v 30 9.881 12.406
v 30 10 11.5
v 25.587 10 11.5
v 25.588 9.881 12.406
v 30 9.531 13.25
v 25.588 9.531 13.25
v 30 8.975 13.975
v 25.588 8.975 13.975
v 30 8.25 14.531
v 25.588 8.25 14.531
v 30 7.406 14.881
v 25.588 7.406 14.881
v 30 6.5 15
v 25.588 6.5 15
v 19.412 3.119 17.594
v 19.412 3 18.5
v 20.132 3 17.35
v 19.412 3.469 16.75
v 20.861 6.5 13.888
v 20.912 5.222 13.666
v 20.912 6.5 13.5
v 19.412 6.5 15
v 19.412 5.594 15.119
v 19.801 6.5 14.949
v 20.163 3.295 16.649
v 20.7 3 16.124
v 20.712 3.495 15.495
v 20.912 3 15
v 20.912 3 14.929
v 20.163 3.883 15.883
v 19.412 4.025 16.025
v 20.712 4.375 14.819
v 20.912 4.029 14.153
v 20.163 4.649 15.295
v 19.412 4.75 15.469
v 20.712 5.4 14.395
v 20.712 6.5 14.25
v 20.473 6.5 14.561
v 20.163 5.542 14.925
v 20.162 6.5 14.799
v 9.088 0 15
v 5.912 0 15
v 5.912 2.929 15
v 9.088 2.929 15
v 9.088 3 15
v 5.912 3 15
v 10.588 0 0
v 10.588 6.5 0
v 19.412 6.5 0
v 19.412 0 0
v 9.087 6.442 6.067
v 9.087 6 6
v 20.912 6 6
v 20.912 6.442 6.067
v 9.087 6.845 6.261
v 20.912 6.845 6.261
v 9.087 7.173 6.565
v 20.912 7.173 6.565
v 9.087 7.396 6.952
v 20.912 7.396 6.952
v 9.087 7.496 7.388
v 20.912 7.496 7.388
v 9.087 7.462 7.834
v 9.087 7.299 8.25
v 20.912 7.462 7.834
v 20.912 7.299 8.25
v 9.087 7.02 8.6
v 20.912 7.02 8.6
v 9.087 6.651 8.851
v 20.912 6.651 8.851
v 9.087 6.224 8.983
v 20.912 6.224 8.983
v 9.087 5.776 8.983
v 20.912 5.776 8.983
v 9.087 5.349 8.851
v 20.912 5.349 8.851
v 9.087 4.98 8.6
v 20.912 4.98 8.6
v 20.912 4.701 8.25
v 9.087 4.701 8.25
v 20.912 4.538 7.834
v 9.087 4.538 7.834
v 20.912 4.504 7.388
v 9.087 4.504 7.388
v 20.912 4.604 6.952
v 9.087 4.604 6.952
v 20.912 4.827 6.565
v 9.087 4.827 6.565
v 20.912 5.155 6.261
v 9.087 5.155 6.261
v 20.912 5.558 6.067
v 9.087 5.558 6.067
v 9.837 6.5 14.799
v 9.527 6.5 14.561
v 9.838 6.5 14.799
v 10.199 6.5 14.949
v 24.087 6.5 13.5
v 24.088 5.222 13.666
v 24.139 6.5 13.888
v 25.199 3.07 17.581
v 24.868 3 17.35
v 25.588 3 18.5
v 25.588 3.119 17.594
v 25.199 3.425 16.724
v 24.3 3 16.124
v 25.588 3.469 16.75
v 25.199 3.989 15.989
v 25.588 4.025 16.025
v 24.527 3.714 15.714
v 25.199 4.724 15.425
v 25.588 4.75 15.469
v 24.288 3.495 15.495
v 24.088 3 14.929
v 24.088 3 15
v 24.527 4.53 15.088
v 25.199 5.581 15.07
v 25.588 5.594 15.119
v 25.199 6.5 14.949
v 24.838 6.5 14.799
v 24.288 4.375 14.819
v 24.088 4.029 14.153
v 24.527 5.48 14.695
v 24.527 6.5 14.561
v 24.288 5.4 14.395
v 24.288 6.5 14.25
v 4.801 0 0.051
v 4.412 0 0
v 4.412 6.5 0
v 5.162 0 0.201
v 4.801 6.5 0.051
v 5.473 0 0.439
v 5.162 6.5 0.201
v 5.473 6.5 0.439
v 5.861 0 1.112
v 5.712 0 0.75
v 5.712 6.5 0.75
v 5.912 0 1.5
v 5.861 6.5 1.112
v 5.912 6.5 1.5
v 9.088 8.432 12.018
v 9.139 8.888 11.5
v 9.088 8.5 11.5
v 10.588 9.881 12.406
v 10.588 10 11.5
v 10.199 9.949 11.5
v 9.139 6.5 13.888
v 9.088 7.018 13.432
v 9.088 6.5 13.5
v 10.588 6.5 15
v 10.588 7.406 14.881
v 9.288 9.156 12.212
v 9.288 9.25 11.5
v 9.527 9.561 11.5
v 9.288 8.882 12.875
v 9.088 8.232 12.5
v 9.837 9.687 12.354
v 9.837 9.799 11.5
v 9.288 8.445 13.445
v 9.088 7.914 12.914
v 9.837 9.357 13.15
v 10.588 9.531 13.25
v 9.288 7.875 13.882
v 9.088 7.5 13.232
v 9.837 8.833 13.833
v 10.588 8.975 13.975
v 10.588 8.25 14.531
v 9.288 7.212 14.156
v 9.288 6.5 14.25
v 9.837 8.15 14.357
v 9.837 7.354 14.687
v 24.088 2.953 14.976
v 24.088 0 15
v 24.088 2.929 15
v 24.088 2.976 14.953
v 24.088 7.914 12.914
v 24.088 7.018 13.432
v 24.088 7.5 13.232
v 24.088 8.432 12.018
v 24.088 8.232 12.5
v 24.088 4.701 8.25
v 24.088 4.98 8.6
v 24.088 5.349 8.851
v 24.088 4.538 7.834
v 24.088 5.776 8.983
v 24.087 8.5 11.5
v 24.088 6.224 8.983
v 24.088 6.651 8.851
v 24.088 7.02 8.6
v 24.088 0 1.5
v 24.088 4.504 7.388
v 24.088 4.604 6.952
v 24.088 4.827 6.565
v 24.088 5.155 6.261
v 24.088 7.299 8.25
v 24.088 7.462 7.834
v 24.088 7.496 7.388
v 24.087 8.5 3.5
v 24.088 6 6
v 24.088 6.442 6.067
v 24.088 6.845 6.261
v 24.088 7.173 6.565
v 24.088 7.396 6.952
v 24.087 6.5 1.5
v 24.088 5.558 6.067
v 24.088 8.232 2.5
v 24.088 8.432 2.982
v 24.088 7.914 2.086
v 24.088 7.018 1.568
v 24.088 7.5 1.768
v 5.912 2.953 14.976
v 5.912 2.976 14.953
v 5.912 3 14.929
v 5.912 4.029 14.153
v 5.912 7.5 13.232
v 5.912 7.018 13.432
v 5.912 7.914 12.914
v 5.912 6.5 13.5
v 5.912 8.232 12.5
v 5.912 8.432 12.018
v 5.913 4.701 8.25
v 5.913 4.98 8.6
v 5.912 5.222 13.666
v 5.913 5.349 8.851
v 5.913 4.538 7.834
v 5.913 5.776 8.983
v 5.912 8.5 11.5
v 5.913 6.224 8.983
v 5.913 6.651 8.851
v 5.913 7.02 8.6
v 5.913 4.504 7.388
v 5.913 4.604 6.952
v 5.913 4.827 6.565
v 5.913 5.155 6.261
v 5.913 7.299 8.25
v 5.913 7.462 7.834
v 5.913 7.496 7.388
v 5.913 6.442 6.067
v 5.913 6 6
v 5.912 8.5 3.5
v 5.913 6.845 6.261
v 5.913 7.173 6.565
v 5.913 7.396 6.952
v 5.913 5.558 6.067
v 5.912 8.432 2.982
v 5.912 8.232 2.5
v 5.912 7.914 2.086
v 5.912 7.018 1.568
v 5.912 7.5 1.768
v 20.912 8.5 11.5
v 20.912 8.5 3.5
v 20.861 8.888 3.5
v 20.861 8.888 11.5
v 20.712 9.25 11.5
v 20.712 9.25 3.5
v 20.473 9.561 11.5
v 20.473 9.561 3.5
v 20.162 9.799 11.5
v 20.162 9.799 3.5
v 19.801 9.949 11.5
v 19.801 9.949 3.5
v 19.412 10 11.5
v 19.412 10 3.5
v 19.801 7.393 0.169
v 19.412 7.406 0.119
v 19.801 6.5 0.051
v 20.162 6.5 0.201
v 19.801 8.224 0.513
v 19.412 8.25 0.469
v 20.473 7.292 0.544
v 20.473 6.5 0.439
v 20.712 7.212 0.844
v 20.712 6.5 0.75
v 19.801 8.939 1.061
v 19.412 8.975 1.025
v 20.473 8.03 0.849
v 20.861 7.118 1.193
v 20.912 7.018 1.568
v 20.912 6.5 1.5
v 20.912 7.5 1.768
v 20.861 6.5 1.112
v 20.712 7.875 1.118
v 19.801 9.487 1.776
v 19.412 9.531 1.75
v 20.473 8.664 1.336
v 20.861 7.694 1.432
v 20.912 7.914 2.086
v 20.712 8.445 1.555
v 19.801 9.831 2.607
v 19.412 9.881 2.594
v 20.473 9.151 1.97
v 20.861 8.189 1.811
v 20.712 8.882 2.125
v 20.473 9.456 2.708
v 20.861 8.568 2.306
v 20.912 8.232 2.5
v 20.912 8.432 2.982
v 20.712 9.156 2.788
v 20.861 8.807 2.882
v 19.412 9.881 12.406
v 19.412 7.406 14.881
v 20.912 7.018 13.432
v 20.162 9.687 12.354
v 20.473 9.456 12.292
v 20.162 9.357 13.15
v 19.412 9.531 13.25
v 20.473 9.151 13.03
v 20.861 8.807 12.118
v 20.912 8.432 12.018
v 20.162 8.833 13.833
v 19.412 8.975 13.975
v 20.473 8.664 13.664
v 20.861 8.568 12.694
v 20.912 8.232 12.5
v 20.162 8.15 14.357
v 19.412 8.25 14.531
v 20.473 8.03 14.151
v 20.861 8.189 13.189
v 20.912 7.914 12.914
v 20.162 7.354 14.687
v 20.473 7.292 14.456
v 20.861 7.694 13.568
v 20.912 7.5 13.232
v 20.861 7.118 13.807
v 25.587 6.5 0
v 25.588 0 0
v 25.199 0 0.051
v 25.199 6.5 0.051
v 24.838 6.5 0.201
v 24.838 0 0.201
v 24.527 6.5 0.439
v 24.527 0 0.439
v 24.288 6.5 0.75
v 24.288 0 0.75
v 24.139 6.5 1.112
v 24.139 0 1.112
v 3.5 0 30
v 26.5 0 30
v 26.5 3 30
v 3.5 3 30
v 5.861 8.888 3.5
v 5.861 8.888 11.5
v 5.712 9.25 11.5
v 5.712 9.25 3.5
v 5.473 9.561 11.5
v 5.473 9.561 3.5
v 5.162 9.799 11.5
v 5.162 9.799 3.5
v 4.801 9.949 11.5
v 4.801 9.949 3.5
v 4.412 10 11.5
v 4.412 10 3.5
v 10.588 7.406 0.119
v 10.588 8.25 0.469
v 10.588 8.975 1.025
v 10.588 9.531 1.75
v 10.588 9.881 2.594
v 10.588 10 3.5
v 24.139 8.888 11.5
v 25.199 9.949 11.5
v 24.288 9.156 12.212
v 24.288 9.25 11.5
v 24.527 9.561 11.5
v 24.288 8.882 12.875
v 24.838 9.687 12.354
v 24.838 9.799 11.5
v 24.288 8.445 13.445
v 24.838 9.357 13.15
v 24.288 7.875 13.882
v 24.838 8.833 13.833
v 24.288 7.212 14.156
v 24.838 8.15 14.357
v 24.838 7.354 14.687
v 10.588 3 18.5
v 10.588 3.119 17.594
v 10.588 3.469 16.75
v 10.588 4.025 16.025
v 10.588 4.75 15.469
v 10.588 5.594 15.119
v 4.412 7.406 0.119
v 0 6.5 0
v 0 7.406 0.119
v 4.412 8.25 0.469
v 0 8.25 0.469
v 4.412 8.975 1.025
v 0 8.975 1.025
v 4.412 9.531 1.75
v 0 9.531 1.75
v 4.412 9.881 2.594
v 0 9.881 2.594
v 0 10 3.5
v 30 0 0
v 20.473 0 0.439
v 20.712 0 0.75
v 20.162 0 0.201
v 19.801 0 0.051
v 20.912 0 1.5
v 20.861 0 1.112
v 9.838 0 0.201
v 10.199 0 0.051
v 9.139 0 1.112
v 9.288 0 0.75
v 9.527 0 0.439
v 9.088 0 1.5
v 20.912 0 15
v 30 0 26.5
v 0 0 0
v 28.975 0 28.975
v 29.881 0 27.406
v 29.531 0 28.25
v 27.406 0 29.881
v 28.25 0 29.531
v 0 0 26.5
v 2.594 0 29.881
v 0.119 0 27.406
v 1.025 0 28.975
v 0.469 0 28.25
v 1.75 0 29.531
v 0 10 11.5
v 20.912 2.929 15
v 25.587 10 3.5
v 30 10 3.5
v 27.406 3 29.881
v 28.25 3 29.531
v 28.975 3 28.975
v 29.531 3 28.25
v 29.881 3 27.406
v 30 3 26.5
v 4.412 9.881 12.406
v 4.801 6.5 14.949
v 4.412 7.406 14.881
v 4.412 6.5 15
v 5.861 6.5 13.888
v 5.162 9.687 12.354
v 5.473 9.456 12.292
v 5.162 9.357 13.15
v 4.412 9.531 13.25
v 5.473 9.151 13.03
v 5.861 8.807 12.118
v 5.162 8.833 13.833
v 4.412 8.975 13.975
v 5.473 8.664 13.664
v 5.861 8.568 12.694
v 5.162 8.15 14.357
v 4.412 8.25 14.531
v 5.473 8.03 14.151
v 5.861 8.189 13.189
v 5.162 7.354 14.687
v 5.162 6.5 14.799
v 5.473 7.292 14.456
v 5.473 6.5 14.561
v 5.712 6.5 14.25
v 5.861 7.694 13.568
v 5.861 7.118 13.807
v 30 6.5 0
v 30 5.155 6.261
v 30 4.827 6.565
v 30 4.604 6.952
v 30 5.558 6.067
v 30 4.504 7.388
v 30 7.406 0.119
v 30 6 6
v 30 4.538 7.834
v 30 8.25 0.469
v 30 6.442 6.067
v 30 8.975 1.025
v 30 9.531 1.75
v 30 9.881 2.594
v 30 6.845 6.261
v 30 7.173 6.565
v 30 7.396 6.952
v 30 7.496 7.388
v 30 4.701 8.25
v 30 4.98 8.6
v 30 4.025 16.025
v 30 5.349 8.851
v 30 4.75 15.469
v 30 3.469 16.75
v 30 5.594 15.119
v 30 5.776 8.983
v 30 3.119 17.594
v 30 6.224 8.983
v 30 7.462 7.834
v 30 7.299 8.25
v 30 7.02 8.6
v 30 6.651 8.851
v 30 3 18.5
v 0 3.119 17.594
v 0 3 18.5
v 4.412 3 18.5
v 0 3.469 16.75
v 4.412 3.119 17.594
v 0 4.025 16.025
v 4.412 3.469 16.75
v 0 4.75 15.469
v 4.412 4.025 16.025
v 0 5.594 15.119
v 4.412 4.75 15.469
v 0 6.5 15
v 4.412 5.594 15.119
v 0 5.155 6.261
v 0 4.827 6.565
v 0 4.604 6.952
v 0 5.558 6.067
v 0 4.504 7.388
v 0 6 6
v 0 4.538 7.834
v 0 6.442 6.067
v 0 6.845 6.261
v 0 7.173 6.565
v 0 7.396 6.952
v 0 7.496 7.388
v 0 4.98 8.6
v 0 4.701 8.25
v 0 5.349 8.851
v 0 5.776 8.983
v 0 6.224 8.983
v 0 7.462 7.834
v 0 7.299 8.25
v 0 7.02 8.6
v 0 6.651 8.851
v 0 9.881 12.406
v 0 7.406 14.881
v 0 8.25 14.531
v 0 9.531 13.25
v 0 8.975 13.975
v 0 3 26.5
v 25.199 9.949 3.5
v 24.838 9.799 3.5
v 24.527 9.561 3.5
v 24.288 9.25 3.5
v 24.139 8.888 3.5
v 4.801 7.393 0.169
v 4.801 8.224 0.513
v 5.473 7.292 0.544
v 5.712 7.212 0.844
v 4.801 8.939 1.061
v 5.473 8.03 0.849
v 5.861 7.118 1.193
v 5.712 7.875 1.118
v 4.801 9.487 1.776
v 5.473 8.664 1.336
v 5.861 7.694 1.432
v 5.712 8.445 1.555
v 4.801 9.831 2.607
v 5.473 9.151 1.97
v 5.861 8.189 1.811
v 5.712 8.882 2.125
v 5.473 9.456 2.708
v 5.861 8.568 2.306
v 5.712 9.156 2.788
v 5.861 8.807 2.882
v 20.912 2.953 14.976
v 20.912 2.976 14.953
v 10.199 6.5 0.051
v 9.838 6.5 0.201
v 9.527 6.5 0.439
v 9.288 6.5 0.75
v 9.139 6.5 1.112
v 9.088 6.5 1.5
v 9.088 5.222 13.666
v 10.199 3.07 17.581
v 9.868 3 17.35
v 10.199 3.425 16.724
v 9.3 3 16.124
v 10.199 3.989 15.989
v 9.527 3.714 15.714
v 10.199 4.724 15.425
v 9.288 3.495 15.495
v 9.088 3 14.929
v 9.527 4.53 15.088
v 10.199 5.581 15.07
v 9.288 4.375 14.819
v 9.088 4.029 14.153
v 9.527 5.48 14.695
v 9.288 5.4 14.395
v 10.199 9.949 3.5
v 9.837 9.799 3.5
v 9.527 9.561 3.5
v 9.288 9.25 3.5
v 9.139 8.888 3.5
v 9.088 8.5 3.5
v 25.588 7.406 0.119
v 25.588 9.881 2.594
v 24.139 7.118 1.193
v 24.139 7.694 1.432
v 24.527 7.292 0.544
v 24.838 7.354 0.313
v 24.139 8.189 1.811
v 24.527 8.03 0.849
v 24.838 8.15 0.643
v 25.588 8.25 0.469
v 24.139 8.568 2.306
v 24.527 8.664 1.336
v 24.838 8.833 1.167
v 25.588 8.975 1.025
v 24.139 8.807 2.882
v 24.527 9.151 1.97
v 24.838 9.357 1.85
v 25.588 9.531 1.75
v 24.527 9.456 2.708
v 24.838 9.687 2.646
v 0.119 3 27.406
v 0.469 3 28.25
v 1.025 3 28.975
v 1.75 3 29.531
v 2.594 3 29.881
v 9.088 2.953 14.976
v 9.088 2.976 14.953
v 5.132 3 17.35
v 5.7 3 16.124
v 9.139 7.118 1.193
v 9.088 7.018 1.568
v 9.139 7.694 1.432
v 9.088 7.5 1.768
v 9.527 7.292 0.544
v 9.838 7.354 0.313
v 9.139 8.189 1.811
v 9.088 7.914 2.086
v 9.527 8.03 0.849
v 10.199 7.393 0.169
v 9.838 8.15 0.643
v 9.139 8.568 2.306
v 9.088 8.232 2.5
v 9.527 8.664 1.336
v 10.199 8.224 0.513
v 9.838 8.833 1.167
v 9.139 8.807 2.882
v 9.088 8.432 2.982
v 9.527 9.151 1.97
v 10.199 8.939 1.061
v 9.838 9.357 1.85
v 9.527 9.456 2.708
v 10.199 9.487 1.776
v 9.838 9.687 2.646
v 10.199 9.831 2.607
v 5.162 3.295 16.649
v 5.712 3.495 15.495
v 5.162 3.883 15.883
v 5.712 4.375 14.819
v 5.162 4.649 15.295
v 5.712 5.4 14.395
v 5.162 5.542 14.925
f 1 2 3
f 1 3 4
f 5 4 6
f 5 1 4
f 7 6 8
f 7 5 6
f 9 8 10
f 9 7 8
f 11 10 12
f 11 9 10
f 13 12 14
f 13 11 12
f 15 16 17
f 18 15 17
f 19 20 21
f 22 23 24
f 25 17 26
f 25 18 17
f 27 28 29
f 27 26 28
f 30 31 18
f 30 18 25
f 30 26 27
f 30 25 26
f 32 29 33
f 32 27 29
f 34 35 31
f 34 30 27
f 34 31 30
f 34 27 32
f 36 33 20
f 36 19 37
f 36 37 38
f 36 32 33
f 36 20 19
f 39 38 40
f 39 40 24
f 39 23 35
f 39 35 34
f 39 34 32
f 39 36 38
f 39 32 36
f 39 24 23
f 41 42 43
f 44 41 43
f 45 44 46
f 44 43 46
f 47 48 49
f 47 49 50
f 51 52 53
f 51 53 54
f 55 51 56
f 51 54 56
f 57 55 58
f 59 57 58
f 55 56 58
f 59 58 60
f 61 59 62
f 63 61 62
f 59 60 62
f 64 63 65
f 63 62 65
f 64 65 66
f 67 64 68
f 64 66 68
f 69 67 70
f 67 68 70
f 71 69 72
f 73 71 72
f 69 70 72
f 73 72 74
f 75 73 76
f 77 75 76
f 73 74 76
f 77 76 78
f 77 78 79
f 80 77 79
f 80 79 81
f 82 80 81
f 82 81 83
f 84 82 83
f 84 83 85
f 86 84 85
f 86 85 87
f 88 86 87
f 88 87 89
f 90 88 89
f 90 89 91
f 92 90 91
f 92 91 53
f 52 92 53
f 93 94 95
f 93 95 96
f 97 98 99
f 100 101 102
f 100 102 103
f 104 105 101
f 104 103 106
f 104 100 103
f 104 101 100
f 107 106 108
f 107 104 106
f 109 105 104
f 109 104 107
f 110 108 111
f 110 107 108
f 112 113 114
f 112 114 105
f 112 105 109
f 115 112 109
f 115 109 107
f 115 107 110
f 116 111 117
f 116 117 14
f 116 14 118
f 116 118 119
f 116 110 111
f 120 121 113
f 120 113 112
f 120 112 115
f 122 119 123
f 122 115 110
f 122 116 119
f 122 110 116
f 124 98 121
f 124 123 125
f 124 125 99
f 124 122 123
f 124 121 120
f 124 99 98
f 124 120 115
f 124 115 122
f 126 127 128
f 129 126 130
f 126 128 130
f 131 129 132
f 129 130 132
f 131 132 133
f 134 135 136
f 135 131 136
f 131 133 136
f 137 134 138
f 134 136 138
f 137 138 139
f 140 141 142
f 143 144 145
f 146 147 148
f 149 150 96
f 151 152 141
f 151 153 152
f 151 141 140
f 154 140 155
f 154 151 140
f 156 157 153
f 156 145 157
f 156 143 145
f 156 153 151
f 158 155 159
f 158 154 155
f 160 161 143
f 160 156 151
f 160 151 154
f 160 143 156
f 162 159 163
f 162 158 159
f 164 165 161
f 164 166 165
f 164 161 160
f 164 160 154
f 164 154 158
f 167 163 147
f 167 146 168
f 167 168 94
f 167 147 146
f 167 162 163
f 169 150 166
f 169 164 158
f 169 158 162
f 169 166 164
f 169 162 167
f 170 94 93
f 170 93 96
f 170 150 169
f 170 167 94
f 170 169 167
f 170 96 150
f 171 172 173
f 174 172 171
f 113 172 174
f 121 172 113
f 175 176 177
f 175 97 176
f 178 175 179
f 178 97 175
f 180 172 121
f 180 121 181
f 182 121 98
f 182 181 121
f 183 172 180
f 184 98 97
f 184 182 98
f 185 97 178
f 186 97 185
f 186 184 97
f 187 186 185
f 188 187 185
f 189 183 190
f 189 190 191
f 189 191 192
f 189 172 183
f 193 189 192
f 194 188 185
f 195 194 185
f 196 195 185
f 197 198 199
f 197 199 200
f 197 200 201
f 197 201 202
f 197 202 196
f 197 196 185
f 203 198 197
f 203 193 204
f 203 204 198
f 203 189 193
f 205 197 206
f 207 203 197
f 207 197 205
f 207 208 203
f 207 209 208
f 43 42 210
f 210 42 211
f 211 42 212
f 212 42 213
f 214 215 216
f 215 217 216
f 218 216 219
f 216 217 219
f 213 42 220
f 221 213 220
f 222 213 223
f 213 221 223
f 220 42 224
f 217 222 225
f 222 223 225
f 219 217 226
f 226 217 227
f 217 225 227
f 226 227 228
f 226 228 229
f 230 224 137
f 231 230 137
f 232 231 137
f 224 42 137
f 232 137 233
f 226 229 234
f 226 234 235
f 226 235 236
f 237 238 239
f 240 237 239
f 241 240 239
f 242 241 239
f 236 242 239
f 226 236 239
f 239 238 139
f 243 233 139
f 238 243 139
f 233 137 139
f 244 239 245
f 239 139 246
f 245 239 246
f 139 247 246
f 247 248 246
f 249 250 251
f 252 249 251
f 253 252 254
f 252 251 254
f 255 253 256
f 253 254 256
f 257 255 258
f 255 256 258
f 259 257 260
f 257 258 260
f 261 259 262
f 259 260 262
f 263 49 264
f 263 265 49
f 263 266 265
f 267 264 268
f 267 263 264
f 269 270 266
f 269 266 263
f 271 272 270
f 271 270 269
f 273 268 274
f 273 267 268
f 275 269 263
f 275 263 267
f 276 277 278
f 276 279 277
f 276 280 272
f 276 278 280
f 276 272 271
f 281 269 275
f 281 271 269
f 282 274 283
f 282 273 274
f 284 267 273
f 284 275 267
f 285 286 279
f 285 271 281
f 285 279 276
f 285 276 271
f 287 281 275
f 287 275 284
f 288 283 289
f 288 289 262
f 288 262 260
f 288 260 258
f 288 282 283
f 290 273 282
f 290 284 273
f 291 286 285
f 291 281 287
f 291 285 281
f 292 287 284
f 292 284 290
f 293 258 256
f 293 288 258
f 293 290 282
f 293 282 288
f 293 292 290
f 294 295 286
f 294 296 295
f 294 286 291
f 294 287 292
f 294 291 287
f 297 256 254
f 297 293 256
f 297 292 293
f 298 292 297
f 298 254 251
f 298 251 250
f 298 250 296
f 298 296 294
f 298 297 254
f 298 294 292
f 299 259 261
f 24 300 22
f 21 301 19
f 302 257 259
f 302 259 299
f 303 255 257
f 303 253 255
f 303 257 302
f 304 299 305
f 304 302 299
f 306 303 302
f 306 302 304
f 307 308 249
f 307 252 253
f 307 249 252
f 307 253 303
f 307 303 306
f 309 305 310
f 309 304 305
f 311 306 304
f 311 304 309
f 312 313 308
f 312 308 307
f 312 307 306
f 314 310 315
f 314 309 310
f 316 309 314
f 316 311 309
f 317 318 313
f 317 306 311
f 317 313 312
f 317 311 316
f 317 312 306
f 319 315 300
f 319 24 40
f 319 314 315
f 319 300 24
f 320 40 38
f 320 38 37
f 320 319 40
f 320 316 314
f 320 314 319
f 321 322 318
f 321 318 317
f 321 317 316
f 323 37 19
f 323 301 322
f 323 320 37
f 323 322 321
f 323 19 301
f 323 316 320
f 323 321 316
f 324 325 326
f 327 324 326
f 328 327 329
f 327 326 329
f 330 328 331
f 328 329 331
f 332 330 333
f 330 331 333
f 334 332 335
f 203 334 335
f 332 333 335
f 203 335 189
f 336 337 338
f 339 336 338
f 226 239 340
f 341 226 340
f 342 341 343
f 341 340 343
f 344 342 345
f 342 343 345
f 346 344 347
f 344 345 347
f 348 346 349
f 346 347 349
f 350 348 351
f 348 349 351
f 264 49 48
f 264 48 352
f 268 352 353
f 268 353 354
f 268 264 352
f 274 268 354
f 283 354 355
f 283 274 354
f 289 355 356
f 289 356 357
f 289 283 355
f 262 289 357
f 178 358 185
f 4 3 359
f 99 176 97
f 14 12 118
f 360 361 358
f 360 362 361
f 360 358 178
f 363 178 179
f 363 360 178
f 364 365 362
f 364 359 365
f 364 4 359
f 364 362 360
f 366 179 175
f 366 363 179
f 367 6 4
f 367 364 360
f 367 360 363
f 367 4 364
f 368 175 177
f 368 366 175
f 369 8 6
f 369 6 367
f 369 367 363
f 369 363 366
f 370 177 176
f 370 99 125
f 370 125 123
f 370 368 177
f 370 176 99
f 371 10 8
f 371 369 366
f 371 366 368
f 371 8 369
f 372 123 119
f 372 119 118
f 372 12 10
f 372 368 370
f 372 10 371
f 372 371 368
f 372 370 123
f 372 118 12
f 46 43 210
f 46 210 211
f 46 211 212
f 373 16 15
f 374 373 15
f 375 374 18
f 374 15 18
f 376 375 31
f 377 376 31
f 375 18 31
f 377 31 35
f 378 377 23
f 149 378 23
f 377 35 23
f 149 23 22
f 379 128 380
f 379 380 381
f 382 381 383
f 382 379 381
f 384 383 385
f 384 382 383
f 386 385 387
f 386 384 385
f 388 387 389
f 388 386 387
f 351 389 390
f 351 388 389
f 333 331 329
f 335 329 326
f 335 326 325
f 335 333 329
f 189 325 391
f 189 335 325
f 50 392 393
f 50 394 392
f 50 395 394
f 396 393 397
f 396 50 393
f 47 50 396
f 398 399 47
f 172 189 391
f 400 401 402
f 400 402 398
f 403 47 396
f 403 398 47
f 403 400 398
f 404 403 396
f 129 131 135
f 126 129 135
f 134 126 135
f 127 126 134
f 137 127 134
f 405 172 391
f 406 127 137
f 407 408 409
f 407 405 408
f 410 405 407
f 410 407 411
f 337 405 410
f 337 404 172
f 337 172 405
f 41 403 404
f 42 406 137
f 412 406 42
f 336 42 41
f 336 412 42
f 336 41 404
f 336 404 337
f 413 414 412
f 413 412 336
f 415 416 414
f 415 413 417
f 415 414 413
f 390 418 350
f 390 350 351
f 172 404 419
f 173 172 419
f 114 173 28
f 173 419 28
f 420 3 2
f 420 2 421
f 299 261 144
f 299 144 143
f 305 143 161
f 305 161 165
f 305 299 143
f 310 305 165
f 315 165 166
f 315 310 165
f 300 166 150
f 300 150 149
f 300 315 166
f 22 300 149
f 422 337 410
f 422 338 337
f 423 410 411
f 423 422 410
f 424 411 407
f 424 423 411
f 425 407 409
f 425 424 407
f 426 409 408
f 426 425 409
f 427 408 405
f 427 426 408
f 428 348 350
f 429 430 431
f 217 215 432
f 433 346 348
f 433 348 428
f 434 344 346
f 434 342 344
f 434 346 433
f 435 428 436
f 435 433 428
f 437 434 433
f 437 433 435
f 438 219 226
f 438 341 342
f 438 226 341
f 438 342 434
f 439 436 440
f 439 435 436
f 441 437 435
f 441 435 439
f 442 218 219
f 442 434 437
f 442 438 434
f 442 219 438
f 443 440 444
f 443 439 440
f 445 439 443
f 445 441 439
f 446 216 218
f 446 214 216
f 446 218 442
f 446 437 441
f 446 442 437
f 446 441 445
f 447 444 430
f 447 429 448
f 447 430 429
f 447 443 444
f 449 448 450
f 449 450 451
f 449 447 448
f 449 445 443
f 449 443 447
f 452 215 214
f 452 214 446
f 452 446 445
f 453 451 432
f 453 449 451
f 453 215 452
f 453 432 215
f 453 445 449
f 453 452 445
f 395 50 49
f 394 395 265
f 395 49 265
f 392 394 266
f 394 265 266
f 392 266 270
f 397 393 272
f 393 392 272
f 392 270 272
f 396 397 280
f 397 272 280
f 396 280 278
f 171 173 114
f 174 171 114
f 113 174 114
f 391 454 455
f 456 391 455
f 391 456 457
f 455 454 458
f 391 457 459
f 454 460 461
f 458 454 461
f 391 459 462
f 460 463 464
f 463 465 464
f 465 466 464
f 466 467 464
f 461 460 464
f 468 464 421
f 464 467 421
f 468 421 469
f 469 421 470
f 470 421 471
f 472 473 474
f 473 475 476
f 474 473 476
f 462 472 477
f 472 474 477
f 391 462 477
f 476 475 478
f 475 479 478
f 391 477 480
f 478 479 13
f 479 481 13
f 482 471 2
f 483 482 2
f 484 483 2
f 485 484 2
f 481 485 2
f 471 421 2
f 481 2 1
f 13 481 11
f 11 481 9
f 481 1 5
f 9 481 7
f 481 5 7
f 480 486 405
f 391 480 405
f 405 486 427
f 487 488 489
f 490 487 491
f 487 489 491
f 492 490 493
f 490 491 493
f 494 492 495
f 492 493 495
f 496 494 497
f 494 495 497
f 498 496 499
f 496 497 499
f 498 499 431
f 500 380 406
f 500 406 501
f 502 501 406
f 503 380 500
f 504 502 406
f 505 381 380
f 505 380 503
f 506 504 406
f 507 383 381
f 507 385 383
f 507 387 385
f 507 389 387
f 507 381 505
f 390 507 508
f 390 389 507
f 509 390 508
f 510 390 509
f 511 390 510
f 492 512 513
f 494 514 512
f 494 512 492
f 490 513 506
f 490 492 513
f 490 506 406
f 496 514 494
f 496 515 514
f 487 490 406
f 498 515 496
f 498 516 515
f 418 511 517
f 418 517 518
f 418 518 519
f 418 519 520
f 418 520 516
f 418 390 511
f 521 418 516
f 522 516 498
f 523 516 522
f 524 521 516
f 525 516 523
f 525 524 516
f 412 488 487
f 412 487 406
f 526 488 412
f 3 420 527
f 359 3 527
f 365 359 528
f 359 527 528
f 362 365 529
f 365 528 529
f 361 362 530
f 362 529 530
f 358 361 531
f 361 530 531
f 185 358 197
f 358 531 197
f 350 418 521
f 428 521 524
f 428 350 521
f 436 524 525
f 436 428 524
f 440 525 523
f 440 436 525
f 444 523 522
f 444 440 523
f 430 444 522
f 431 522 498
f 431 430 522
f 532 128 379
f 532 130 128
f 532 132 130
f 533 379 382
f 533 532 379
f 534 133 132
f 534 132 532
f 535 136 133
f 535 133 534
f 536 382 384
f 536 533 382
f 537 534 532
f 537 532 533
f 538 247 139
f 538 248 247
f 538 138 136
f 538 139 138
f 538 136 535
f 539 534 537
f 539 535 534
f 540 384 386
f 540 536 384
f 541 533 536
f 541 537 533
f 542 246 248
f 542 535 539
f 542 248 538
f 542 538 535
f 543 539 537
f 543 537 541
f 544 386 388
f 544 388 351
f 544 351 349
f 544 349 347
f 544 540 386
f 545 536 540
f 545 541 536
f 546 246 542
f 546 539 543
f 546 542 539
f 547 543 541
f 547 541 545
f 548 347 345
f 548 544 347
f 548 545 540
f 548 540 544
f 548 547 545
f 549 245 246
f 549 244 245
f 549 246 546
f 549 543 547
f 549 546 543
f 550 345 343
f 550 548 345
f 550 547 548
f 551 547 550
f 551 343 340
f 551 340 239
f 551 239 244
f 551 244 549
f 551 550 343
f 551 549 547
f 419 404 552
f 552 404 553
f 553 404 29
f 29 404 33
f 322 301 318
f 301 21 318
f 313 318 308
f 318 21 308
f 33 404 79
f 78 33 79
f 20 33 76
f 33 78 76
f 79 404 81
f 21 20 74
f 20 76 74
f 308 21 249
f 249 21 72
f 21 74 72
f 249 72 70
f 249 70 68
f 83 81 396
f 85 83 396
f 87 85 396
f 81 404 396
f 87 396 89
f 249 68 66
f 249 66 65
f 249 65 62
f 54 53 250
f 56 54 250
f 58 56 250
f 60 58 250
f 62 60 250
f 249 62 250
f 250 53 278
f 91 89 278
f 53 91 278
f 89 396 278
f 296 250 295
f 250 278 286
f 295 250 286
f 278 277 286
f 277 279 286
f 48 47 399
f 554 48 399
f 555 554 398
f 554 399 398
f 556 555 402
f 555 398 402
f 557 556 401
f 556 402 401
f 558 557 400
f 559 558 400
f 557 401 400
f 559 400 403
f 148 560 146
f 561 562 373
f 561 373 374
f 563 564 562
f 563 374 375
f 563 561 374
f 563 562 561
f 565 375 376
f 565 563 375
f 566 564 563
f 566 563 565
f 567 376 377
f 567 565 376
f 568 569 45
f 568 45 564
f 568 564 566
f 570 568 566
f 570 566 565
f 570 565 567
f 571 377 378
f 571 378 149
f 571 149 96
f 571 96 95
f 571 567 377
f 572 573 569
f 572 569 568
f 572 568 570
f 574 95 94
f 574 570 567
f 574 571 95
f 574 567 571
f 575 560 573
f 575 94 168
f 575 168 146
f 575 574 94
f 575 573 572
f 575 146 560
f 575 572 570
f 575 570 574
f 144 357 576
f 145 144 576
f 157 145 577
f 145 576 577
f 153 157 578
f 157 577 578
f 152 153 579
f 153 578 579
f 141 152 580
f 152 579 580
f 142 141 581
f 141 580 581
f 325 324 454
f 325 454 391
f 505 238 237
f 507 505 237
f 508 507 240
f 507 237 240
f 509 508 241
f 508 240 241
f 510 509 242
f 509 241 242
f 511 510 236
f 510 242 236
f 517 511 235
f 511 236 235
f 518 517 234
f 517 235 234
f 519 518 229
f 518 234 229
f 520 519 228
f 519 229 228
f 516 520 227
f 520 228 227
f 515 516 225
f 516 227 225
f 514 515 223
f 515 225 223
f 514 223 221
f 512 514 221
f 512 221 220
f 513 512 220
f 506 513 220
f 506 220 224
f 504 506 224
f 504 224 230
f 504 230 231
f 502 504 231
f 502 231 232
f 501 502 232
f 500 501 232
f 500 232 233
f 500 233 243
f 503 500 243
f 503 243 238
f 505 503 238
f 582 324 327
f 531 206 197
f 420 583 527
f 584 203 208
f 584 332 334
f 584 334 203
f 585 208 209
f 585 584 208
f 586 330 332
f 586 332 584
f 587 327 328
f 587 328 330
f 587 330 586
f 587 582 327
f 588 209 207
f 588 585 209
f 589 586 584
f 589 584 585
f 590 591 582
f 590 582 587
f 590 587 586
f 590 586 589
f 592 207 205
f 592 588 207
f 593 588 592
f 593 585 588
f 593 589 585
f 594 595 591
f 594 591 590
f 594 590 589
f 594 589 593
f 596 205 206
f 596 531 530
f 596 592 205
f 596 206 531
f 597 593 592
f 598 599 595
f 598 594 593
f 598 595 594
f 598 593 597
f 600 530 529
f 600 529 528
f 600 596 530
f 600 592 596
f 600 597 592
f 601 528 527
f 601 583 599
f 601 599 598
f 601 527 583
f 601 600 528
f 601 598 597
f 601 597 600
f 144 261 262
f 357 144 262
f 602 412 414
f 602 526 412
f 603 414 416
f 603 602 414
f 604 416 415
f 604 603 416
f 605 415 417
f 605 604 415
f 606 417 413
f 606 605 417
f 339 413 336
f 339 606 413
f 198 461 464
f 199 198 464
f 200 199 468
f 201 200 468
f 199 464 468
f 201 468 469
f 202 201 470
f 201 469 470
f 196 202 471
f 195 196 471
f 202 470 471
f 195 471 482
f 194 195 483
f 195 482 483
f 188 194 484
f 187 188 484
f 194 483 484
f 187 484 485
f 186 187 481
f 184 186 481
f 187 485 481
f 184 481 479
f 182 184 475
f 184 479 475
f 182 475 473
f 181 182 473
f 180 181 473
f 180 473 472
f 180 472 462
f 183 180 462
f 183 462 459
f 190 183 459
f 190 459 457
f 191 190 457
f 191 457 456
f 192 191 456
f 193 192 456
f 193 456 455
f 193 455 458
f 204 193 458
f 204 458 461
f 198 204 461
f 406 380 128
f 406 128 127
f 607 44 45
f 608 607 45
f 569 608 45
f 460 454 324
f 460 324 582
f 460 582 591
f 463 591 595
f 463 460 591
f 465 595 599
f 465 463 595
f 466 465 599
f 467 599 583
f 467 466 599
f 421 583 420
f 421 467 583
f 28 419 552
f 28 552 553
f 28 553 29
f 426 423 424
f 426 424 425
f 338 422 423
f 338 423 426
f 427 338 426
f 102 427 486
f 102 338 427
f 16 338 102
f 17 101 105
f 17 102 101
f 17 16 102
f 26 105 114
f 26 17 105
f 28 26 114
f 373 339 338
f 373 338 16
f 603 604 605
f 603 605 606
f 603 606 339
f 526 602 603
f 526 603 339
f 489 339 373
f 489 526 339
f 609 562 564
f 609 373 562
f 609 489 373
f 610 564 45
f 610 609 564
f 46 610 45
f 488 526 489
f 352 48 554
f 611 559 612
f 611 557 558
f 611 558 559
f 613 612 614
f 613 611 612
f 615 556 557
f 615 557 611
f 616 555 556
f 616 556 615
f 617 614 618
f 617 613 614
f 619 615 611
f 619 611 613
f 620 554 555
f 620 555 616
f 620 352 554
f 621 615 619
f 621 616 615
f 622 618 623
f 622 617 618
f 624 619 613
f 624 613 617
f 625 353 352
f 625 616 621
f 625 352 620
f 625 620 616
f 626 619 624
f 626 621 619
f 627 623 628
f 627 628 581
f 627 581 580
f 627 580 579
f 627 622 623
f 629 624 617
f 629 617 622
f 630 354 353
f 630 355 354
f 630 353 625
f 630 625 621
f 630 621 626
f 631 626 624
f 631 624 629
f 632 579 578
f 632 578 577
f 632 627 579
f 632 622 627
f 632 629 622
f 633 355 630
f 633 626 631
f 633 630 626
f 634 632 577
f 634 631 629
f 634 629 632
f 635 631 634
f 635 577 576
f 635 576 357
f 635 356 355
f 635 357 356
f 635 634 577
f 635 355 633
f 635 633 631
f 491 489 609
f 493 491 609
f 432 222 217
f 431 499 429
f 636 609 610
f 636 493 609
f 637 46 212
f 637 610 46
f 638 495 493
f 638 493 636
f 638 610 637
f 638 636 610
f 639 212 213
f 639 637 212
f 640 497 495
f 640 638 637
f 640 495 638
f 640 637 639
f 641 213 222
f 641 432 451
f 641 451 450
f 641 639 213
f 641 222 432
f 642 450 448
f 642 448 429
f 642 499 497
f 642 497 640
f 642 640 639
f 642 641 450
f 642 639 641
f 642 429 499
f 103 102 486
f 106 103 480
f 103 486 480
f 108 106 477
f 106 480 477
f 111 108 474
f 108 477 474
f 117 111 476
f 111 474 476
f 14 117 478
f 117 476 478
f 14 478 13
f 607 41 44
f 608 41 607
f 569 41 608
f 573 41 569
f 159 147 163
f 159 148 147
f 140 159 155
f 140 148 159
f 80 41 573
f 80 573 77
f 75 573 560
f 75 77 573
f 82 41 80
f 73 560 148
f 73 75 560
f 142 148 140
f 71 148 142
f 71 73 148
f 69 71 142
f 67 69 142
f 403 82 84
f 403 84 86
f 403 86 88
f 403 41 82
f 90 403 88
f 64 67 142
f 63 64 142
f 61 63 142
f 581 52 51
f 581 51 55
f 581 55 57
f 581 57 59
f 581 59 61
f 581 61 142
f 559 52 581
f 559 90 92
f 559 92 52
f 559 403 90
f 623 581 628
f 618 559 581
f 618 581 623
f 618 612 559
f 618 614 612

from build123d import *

# Parameters (mm, degrees)
BOSS_EXTRUDE1_DEPTH = 30
SKETCH2_R           = 1.5
CUT_EXTRUDE1_DEPTH  = 44.588989435
CUT_EXTRUDE2_REACH  = 45.589
SKETCH3_W           = 3.175
SKETCH3_H           = 10
FILLET1_R           = 3.5
FILLET2_R           = 1.5


# Some blends are built 0.0001 mm under size
with BuildPart() as part:
    # Sketch1 → Boss-Extrude1 (new body)
    with BuildSketch(Plane(origin=(0, 0, 0), x_dir=(0, 0, -1), z_dir=(1, 0, 0))):
        Polygon((0, 0), (-30, 0), (-30, 3), (-15, 3), (-15, 10), (0, 10), align=None)
    extrude(amount=BOSS_EXTRUDE1_DEPTH)

    # Sketch2 → Cut-Extrude1 (cut, through all)
    with BuildSketch(Plane(origin=(30, 0, 0), x_dir=(0, 0, -1), z_dir=(1, 0, 0))):
        with Locations((-7.5, 6)):
            Circle(SKETCH2_R)
    extrude(amount=-CUT_EXTRUDE1_DEPTH, mode=Mode.SUBTRACT)

    # Cut-Extrude2: up to this face of the body (flat: up to its plane)
    cut_extrude2_end = Plane(part.part.faces().sort_by_distance((15, 6.5, 15))[0])
    # Sketch3 → Cut-Extrude2 (cut, up to the picked face)
    with BuildSketch(Plane(origin=(0, 0, 0), x_dir=(-1, 0, 0), z_dir=(0, 0, -1)), mode=Mode.PRIVATE) as cut_extrude2_sk1:
        with Locations((-7.5, 5)):
            Rectangle(SKETCH3_W, SKETCH3_H)
    cut_extrude2_tool1 = split(extrude(cut_extrude2_sk1.sketch, amount=-CUT_EXTRUDE2_REACH, mode=Mode.PRIVATE), bisect_by=cut_extrude2_end, keep=Keep.BOTH, mode=Mode.PRIVATE)
    # Sketch3 → Cut-Extrude2 (cut, up to the picked face)
    with BuildSketch(Plane(origin=(0, 0, 0), x_dir=(-1, 0, 0), z_dir=(0, 0, -1)), mode=Mode.PRIVATE) as cut_extrude2_sk2:
        with Locations((-22.5, 5)):
            Rectangle(SKETCH3_W, SKETCH3_H)
    cut_extrude2_tool2 = split(extrude(cut_extrude2_sk2.sketch, amount=-CUT_EXTRUDE2_REACH, mode=Mode.PRIVATE), bisect_by=cut_extrude2_end, keep=Keep.BOTH, mode=Mode.PRIVATE)
    add(cut_extrude2_tool1.solids().sort_by(Axis((7.5, 5, 0), (0, 0, 1)))[0], mode=Mode.SUBTRACT)
    add(cut_extrude2_tool2.solids().sort_by(Axis((22.5, 5, 0), (0, 0, 1)))[0], mode=Mode.SUBTRACT)

    # Fillet1
    fillet1_edges = [part.edges().sort_by_distance(p)[0] for p in [
        (0, 1.5, 30),
        (30, 1.5, 30),
        (15, 10, 0),
        (15, 3, 15),
        (15, 10, 15),
        (2.95625, 10, 0),
        (27.04375, 10, 0),
        (2.95625, 10, 15),
        (27.04375, 10, 15),
        (27.04375, 3, 15),
        (2.95625, 3, 15),
    ]]
    fillet(fillet1_edges, radius=FILLET1_R - 0.0001)  # a hair under: the kernel refuses the full size

    # Fillet2
    # the kernel refuses this fillet: 1.5 mm, written as the material it takes off along each edge
    with BuildSketch(Plane(origin=(5.9125, 6.4999, 18.4999), x_dir=(0, -0.4784658161489802, 0.87810617967128), z_dir=(0, 0.87810617967128, 0.4784658161489802))) as fillet2_piece_1_section:
        with BuildLine():
            CenterArc((3.4999 + FILLET2_R, -FILLET2_R), FILLET2_R, 90, 90)
            Line((3.4999, -FILLET2_R), (3.4999, 0))
            Line((3.4999, 0), (3.4999 + FILLET2_R, 0))
        make_face()
    fillet2_piece_1 = revolve(axis=Axis((5.9125, 6.4999, 18.4999), (1, 0, 0)), revolution_arc=151.414750095, mode=Mode.PRIVATE)
    fillet2_piece_1 = split(fillet2_piece_1, bisect_by=Plane(origin=(5.513661533, 3, 15.961303767), z_dir=(0, 1, 0)), keep=Keep.TOP, mode=Mode.PRIVATE)
    add(fillet2_piece_1, mode=Mode.SUBTRACT)
    with BuildSketch(Plane(origin=(5.9125, 6.4999, 18.4999), x_dir=(0, -0.4784658161489802, 0.87810617967128), z_dir=(0, 0.87810617967128, 0.4784658161489802))) as fillet2_piece_2_section:
        with BuildLine():
            CenterArc((3.4999 + FILLET2_R, -FILLET2_R), FILLET2_R, 90, 90)
            Line((3.4999, -FILLET2_R), (3.4999, 0))
            Line((3.4999, 0), (3.4999 + FILLET2_R, 0))
        make_face()
    fillet2_piece_2 = revolve(axis=Axis((5.9125, 6.4999, 18.4999), (1, 0, 0)), revolution_arc=151.414750095, mode=Mode.PRIVATE)
    fillet2_piece_2 = split(fillet2_piece_2, bisect_by=Plane(origin=(5.912331241, 2.985794163, 15), z_dir=(0, 0, -1)), keep=Keep.TOP, mode=Mode.PRIVATE)
    add(fillet2_piece_2, mode=Mode.SUBTRACT)
    with BuildSketch(Plane(origin=(5.9125, 6.5001, 11.5001), x_dir=(0, 1, 0), z_dir=(0, 0, -1))) as fillet2_piece_3:
        with BuildLine():
            CenterArc((3.4999 - FILLET2_R, -FILLET2_R), FILLET2_R, 360, 90)
            Line((3.4999, -FILLET2_R), (3.4999, 0))
            Line((3.4999, 0), (3.4999 - FILLET2_R, 0))
        make_face()
    revolve(axis=Axis((5.9125, 6.5001, 11.5001), (1, 0, 0)), revolution_arc=90, mode=Mode.SUBTRACT)
    with BuildSketch(Plane(origin=(5.9125, 6.5001, 0), x_dir=(-1, 0, 0), z_dir=(0, -1, 0)), Plane(origin=(24.0875, -3.75, 0), x_dir=(1, 0, 0), z_dir=(0, 1, 0)), Plane(origin=(20.9125, 6.5001, 0), x_dir=(-1, 0, 0), z_dir=(0, -1, 0))) as fillet2_piece_4:
        with BuildLine():
            CenterArc((FILLET2_R, -FILLET2_R), FILLET2_R, 90, 90)
            Line((0, -FILLET2_R), (0, 0))
            Line((0, 0), (FILLET2_R, 0))
        make_face()
    extrude(amount=10.2501, mode=Mode.SUBTRACT)
    with BuildSketch(Plane(origin=(5.9125, 6.5001, 3.4999), x_dir=(0, 0, -1), z_dir=(0, -1, 0))) as fillet2_piece_5:
        with BuildLine():
            CenterArc((3.4999 - FILLET2_R, -FILLET2_R), FILLET2_R, 0, 90)
            Line((3.4999, -FILLET2_R), (3.4999, 0))
            Line((3.4999, 0), (3.4999 - FILLET2_R, 0))
        make_face()
    revolve(axis=Axis((5.9125, 6.5001, 3.4999), (1, 0, 0)), revolution_arc=90, mode=Mode.SUBTRACT)
    with BuildSketch(Plane(origin=(9.0875, 6.4999, 18.4999), x_dir=(0, -0.478465816148981, 0.8781061796712796), z_dir=(0, 0.8781061796712796, 0.478465816148981))) as fillet2_piece_6_section:
        with BuildLine():
            CenterArc((3.4999 + FILLET2_R, FILLET2_R), FILLET2_R, 180, 90)
            Line((3.4999, FILLET2_R), (3.4999, 0))
            Line((3.4999, 0), (3.4999 + FILLET2_R, 0))
        make_face()
    fillet2_piece_6 = revolve(axis=Axis((9.0875, 6.4999, 18.4999), (1, 0, 0)), revolution_arc=151.414750095, mode=Mode.PRIVATE)
    fillet2_piece_6 = split(fillet2_piece_6, bisect_by=Plane(origin=(9.486338509, 3, 15.961303608), z_dir=(0, 1, 0)), keep=Keep.TOP, mode=Mode.PRIVATE)
    add(fillet2_piece_6, mode=Mode.SUBTRACT)
    with BuildSketch(Plane(origin=(9.0875, 6.4999, 18.4999), x_dir=(0, -0.478465816148981, 0.8781061796712796), z_dir=(0, 0.8781061796712796, 0.478465816148981))) as fillet2_piece_7_section:
        with BuildLine():
            CenterArc((3.4999 + FILLET2_R, FILLET2_R), FILLET2_R, 180, 90)
            Line((3.4999, FILLET2_R), (3.4999, 0))
            Line((3.4999, 0), (3.4999 + FILLET2_R, 0))
        make_face()
    fillet2_piece_7 = revolve(axis=Axis((9.0875, 6.4999, 18.4999), (1, 0, 0)), revolution_arc=151.414750095, mode=Mode.PRIVATE)
    fillet2_piece_7 = split(fillet2_piece_7, bisect_by=Plane(origin=(9.087668759, 2.985794163, 15), z_dir=(0, 0, -1)), keep=Keep.TOP, mode=Mode.PRIVATE)
    add(fillet2_piece_7, mode=Mode.SUBTRACT)
    with BuildSketch(Plane(origin=(9.0875, 6.5001, 11.5001), x_dir=(0, 1, 0), z_dir=(0, 0, -1))) as fillet2_piece_8:
        with BuildLine():
            CenterArc((3.4999 - FILLET2_R, FILLET2_R), FILLET2_R, 270, 90)
            Line((3.4999, FILLET2_R), (3.4999, 0))
            Line((3.4999, 0), (3.4999 - FILLET2_R, 0))
        make_face()
    revolve(axis=Axis((9.0875, 6.5001, 11.5001), (1, 0, 0)), revolution_arc=90, mode=Mode.SUBTRACT)
    with BuildSketch(Plane(origin=(9.0875, -3.75, 0), x_dir=(0, 0, 1), z_dir=(0, 1, 0))) as fillet2_piece_9:
        with BuildLine():
            CenterArc((FILLET2_R, FILLET2_R), FILLET2_R, 180, 90)
            Line((0, FILLET2_R), (0, 0))
            Line((0, 0), (FILLET2_R, 0))
        make_face()
    extrude(amount=10.2501, mode=Mode.SUBTRACT)
    with BuildSketch(Plane(origin=(9.0875, 6.5001, 3.4999), x_dir=(0, 0, -1), z_dir=(0, -1, 0))) as fillet2_piece_10:
        with BuildLine():
            CenterArc((3.4999 - FILLET2_R, FILLET2_R), FILLET2_R, 270, 90)
            Line((3.4999, FILLET2_R), (3.4999, 0))
            Line((3.4999, 0), (3.4999 - FILLET2_R, 0))
        make_face()
    revolve(axis=Axis((9.0875, 6.5001, 3.4999), (1, 0, 0)), revolution_arc=90, mode=Mode.SUBTRACT)
    with BuildSketch(Plane(origin=(24.0875, 6.4999, 18.4999), x_dir=(0, -0.478465816148981, 0.8781061796712796), z_dir=(0, 0.8781061796712796, 0.478465816148981))) as fillet2_piece_11_section:
        with BuildLine():
            CenterArc((3.4999 + FILLET2_R, FILLET2_R), FILLET2_R, 180, 90)
            Line((3.4999, FILLET2_R), (3.4999, 0))
            Line((3.4999, 0), (3.4999 + FILLET2_R, 0))
        make_face()
    fillet2_piece_11 = revolve(axis=Axis((24.0875, 6.4999, 18.4999), (1, 0, 0)), revolution_arc=151.414750095, mode=Mode.PRIVATE)
    fillet2_piece_11 = split(fillet2_piece_11, bisect_by=Plane(origin=(24.486338467, 3, 15.961303767), z_dir=(0, 1, 0)), keep=Keep.TOP, mode=Mode.PRIVATE)
    add(fillet2_piece_11, mode=Mode.SUBTRACT)
    with BuildSketch(Plane(origin=(24.0875, 6.4999, 18.4999), x_dir=(0, -0.478465816148981, 0.8781061796712796), z_dir=(0, 0.8781061796712796, 0.478465816148981))) as fillet2_piece_12_section:
        with BuildLine():
            CenterArc((3.4999 + FILLET2_R, FILLET2_R), FILLET2_R, 180, 90)
            Line((3.4999, FILLET2_R), (3.4999, 0))
            Line((3.4999, 0), (3.4999 + FILLET2_R, 0))
        make_face()
    fillet2_piece_12 = revolve(axis=Axis((24.0875, 6.4999, 18.4999), (1, 0, 0)), revolution_arc=151.414750095, mode=Mode.PRIVATE)
    fillet2_piece_12 = split(fillet2_piece_12, bisect_by=Plane(origin=(24.087668759, 2.985794163, 15), z_dir=(0, 0, -1)), keep=Keep.TOP, mode=Mode.PRIVATE)
    add(fillet2_piece_12, mode=Mode.SUBTRACT)
    with BuildSketch(Plane(origin=(24.0875, 6.5001, 11.5001), x_dir=(0, 1, 0), z_dir=(0, 0, -1))) as fillet2_piece_13:
        with BuildLine():
            CenterArc((3.4999 - FILLET2_R, FILLET2_R), FILLET2_R, 270, 90)
            Line((3.4999, FILLET2_R), (3.4999, 0))
            Line((3.4999, 0), (3.4999 - FILLET2_R, 0))
        make_face()
    revolve(axis=Axis((24.0875, 6.5001, 11.5001), (1, 0, 0)), revolution_arc=90, mode=Mode.SUBTRACT)
    with BuildSketch(Plane(origin=(24.0875, 6.5001, 3.4999), x_dir=(0, 0, -1), z_dir=(0, -1, 0))) as fillet2_piece_14:
        with BuildLine():
            CenterArc((3.4999 - FILLET2_R, FILLET2_R), FILLET2_R, 270, 90)
            Line((3.4999, FILLET2_R), (3.4999, 0))
            Line((3.4999, 0), (3.4999 - FILLET2_R, 0))
        make_face()
    revolve(axis=Axis((24.0875, 6.5001, 3.4999), (1, 0, 0)), revolution_arc=90, mode=Mode.SUBTRACT)
    with BuildSketch(Plane(origin=(20.9125, 6.4999, 18.4999), x_dir=(0, -0.478465816148981, 0.8781061796712796), z_dir=(0, 0.8781061796712796, 0.478465816148981))) as fillet2_piece_15_section:
        with BuildLine():
            CenterArc((3.4999 + FILLET2_R, -FILLET2_R), FILLET2_R, 90, 90)
            Line((3.4999, -FILLET2_R), (3.4999, 0))
            Line((3.4999, 0), (3.4999 + FILLET2_R, 0))
        make_face()
    fillet2_piece_15 = revolve(axis=Axis((20.9125, 6.4999, 18.4999), (1, 0, 0)), revolution_arc=151.414750095, mode=Mode.PRIVATE)
    fillet2_piece_15 = split(fillet2_piece_15, bisect_by=Plane(origin=(20.513661491, 3, 15.961303608), z_dir=(0, 1, 0)), keep=Keep.TOP, mode=Mode.PRIVATE)
    add(fillet2_piece_15, mode=Mode.SUBTRACT)
    with BuildSketch(Plane(origin=(20.9125, 6.4999, 18.4999), x_dir=(0, -0.478465816148981, 0.8781061796712796), z_dir=(0, 0.8781061796712796, 0.478465816148981))) as fillet2_piece_16_section:
        with BuildLine():
            CenterArc((3.4999 + FILLET2_R, -FILLET2_R), FILLET2_R, 90, 90)
            Line((3.4999, -FILLET2_R), (3.4999, 0))
            Line((3.4999, 0), (3.4999 + FILLET2_R, 0))
        make_face()
    fillet2_piece_16 = revolve(axis=Axis((20.9125, 6.4999, 18.4999), (1, 0, 0)), revolution_arc=151.414750095, mode=Mode.PRIVATE)
    fillet2_piece_16 = split(fillet2_piece_16, bisect_by=Plane(origin=(20.912331241, 2.985794163, 15), z_dir=(0, 0, -1)), keep=Keep.TOP, mode=Mode.PRIVATE)
    add(fillet2_piece_16, mode=Mode.SUBTRACT)
    with BuildSketch(Plane(origin=(20.9125, 6.5001, 11.5001), x_dir=(0, 1, 0), z_dir=(0, 0, -1))) as fillet2_piece_17:
        with BuildLine():
            CenterArc((3.4999 - FILLET2_R, -FILLET2_R), FILLET2_R, 0, 90)
            Line((3.4999, -FILLET2_R), (3.4999, 0))
            Line((3.4999, 0), (3.4999 - FILLET2_R, 0))
        make_face()
    revolve(axis=Axis((20.9125, 6.5001, 11.5001), (1, 0, 0)), revolution_arc=90, mode=Mode.SUBTRACT)
    with BuildSketch(Plane(origin=(20.9125, 6.5001, 3.4999), x_dir=(0, 0, -1), z_dir=(0, -1, 0))) as fillet2_piece_18:
        with BuildLine():
            CenterArc((3.4999 - FILLET2_R, -FILLET2_R), FILLET2_R, 0, 90)
            Line((3.4999, -FILLET2_R), (3.4999, 0))
            Line((3.4999, 0), (3.4999 - FILLET2_R, 0))
        make_face()
    revolve(axis=Axis((20.9125, 6.5001, 3.4999), (1, 0, 0)), revolution_arc=90, mode=Mode.SUBTRACT)
    with BuildSketch(Plane(origin=(5.9125, 10, 3.4999), x_dir=(0, -1, 0), z_dir=(0, 0, 1)), Plane(origin=(20.9125, 10, 3.4999), x_dir=(0, -1, 0), z_dir=(0, 0, 1))) as fillet2_piece_19:
        with BuildLine():
            CenterArc((FILLET2_R, -FILLET2_R), FILLET2_R, 90, 90)
            Line((0, -FILLET2_R), (0, 0))
            Line((0, 0), (FILLET2_R, 0))
        make_face()
    extrude(amount=8.0002, mode=Mode.SUBTRACT)
    with BuildSketch(Plane(origin=(9.0875, 10, 3.4999), x_dir=(0, -1, 0), z_dir=(0, 0, 1)), Plane(origin=(24.0875, 10, 3.4999), x_dir=(0, -1, 0), z_dir=(0, 0, 1))) as fillet2_piece_20:
        with BuildLine():
            CenterArc((FILLET2_R, FILLET2_R), FILLET2_R, 180, 90)
            Line((0, FILLET2_R), (0, 0))
            Line((0, 0), (FILLET2_R, 0))
        make_face()
    extrude(amount=8.0002, mode=Mode.SUBTRACT)
    with BuildSketch(Plane(origin=(20.9125, 6.5001, 15), x_dir=(0, 0, -1), z_dir=(0, -1, 0)), Plane(origin=(24.0875, 6.4999, 15), x_dir=(0, 0, -1), z_dir=(0, 1, 0)), Plane(origin=(9.0875, 6.4999, 15), x_dir=(0, 0, -1), z_dir=(0, 1, 0)), Plane(origin=(5.9125, 6.5001, 15), x_dir=(0, 0, -1), z_dir=(0, -1, 0))) as fillet2_piece_21:
        with BuildLine():
            CenterArc((FILLET2_R, -FILLET2_R), FILLET2_R, 90, 90)
            Line((0, -FILLET2_R), (0, 0))
            Line((0, 0), (FILLET2_R, 0))
        make_face()
    extrude(amount=0.0002, mode=Mode.SUBTRACT)


solid = part.part
